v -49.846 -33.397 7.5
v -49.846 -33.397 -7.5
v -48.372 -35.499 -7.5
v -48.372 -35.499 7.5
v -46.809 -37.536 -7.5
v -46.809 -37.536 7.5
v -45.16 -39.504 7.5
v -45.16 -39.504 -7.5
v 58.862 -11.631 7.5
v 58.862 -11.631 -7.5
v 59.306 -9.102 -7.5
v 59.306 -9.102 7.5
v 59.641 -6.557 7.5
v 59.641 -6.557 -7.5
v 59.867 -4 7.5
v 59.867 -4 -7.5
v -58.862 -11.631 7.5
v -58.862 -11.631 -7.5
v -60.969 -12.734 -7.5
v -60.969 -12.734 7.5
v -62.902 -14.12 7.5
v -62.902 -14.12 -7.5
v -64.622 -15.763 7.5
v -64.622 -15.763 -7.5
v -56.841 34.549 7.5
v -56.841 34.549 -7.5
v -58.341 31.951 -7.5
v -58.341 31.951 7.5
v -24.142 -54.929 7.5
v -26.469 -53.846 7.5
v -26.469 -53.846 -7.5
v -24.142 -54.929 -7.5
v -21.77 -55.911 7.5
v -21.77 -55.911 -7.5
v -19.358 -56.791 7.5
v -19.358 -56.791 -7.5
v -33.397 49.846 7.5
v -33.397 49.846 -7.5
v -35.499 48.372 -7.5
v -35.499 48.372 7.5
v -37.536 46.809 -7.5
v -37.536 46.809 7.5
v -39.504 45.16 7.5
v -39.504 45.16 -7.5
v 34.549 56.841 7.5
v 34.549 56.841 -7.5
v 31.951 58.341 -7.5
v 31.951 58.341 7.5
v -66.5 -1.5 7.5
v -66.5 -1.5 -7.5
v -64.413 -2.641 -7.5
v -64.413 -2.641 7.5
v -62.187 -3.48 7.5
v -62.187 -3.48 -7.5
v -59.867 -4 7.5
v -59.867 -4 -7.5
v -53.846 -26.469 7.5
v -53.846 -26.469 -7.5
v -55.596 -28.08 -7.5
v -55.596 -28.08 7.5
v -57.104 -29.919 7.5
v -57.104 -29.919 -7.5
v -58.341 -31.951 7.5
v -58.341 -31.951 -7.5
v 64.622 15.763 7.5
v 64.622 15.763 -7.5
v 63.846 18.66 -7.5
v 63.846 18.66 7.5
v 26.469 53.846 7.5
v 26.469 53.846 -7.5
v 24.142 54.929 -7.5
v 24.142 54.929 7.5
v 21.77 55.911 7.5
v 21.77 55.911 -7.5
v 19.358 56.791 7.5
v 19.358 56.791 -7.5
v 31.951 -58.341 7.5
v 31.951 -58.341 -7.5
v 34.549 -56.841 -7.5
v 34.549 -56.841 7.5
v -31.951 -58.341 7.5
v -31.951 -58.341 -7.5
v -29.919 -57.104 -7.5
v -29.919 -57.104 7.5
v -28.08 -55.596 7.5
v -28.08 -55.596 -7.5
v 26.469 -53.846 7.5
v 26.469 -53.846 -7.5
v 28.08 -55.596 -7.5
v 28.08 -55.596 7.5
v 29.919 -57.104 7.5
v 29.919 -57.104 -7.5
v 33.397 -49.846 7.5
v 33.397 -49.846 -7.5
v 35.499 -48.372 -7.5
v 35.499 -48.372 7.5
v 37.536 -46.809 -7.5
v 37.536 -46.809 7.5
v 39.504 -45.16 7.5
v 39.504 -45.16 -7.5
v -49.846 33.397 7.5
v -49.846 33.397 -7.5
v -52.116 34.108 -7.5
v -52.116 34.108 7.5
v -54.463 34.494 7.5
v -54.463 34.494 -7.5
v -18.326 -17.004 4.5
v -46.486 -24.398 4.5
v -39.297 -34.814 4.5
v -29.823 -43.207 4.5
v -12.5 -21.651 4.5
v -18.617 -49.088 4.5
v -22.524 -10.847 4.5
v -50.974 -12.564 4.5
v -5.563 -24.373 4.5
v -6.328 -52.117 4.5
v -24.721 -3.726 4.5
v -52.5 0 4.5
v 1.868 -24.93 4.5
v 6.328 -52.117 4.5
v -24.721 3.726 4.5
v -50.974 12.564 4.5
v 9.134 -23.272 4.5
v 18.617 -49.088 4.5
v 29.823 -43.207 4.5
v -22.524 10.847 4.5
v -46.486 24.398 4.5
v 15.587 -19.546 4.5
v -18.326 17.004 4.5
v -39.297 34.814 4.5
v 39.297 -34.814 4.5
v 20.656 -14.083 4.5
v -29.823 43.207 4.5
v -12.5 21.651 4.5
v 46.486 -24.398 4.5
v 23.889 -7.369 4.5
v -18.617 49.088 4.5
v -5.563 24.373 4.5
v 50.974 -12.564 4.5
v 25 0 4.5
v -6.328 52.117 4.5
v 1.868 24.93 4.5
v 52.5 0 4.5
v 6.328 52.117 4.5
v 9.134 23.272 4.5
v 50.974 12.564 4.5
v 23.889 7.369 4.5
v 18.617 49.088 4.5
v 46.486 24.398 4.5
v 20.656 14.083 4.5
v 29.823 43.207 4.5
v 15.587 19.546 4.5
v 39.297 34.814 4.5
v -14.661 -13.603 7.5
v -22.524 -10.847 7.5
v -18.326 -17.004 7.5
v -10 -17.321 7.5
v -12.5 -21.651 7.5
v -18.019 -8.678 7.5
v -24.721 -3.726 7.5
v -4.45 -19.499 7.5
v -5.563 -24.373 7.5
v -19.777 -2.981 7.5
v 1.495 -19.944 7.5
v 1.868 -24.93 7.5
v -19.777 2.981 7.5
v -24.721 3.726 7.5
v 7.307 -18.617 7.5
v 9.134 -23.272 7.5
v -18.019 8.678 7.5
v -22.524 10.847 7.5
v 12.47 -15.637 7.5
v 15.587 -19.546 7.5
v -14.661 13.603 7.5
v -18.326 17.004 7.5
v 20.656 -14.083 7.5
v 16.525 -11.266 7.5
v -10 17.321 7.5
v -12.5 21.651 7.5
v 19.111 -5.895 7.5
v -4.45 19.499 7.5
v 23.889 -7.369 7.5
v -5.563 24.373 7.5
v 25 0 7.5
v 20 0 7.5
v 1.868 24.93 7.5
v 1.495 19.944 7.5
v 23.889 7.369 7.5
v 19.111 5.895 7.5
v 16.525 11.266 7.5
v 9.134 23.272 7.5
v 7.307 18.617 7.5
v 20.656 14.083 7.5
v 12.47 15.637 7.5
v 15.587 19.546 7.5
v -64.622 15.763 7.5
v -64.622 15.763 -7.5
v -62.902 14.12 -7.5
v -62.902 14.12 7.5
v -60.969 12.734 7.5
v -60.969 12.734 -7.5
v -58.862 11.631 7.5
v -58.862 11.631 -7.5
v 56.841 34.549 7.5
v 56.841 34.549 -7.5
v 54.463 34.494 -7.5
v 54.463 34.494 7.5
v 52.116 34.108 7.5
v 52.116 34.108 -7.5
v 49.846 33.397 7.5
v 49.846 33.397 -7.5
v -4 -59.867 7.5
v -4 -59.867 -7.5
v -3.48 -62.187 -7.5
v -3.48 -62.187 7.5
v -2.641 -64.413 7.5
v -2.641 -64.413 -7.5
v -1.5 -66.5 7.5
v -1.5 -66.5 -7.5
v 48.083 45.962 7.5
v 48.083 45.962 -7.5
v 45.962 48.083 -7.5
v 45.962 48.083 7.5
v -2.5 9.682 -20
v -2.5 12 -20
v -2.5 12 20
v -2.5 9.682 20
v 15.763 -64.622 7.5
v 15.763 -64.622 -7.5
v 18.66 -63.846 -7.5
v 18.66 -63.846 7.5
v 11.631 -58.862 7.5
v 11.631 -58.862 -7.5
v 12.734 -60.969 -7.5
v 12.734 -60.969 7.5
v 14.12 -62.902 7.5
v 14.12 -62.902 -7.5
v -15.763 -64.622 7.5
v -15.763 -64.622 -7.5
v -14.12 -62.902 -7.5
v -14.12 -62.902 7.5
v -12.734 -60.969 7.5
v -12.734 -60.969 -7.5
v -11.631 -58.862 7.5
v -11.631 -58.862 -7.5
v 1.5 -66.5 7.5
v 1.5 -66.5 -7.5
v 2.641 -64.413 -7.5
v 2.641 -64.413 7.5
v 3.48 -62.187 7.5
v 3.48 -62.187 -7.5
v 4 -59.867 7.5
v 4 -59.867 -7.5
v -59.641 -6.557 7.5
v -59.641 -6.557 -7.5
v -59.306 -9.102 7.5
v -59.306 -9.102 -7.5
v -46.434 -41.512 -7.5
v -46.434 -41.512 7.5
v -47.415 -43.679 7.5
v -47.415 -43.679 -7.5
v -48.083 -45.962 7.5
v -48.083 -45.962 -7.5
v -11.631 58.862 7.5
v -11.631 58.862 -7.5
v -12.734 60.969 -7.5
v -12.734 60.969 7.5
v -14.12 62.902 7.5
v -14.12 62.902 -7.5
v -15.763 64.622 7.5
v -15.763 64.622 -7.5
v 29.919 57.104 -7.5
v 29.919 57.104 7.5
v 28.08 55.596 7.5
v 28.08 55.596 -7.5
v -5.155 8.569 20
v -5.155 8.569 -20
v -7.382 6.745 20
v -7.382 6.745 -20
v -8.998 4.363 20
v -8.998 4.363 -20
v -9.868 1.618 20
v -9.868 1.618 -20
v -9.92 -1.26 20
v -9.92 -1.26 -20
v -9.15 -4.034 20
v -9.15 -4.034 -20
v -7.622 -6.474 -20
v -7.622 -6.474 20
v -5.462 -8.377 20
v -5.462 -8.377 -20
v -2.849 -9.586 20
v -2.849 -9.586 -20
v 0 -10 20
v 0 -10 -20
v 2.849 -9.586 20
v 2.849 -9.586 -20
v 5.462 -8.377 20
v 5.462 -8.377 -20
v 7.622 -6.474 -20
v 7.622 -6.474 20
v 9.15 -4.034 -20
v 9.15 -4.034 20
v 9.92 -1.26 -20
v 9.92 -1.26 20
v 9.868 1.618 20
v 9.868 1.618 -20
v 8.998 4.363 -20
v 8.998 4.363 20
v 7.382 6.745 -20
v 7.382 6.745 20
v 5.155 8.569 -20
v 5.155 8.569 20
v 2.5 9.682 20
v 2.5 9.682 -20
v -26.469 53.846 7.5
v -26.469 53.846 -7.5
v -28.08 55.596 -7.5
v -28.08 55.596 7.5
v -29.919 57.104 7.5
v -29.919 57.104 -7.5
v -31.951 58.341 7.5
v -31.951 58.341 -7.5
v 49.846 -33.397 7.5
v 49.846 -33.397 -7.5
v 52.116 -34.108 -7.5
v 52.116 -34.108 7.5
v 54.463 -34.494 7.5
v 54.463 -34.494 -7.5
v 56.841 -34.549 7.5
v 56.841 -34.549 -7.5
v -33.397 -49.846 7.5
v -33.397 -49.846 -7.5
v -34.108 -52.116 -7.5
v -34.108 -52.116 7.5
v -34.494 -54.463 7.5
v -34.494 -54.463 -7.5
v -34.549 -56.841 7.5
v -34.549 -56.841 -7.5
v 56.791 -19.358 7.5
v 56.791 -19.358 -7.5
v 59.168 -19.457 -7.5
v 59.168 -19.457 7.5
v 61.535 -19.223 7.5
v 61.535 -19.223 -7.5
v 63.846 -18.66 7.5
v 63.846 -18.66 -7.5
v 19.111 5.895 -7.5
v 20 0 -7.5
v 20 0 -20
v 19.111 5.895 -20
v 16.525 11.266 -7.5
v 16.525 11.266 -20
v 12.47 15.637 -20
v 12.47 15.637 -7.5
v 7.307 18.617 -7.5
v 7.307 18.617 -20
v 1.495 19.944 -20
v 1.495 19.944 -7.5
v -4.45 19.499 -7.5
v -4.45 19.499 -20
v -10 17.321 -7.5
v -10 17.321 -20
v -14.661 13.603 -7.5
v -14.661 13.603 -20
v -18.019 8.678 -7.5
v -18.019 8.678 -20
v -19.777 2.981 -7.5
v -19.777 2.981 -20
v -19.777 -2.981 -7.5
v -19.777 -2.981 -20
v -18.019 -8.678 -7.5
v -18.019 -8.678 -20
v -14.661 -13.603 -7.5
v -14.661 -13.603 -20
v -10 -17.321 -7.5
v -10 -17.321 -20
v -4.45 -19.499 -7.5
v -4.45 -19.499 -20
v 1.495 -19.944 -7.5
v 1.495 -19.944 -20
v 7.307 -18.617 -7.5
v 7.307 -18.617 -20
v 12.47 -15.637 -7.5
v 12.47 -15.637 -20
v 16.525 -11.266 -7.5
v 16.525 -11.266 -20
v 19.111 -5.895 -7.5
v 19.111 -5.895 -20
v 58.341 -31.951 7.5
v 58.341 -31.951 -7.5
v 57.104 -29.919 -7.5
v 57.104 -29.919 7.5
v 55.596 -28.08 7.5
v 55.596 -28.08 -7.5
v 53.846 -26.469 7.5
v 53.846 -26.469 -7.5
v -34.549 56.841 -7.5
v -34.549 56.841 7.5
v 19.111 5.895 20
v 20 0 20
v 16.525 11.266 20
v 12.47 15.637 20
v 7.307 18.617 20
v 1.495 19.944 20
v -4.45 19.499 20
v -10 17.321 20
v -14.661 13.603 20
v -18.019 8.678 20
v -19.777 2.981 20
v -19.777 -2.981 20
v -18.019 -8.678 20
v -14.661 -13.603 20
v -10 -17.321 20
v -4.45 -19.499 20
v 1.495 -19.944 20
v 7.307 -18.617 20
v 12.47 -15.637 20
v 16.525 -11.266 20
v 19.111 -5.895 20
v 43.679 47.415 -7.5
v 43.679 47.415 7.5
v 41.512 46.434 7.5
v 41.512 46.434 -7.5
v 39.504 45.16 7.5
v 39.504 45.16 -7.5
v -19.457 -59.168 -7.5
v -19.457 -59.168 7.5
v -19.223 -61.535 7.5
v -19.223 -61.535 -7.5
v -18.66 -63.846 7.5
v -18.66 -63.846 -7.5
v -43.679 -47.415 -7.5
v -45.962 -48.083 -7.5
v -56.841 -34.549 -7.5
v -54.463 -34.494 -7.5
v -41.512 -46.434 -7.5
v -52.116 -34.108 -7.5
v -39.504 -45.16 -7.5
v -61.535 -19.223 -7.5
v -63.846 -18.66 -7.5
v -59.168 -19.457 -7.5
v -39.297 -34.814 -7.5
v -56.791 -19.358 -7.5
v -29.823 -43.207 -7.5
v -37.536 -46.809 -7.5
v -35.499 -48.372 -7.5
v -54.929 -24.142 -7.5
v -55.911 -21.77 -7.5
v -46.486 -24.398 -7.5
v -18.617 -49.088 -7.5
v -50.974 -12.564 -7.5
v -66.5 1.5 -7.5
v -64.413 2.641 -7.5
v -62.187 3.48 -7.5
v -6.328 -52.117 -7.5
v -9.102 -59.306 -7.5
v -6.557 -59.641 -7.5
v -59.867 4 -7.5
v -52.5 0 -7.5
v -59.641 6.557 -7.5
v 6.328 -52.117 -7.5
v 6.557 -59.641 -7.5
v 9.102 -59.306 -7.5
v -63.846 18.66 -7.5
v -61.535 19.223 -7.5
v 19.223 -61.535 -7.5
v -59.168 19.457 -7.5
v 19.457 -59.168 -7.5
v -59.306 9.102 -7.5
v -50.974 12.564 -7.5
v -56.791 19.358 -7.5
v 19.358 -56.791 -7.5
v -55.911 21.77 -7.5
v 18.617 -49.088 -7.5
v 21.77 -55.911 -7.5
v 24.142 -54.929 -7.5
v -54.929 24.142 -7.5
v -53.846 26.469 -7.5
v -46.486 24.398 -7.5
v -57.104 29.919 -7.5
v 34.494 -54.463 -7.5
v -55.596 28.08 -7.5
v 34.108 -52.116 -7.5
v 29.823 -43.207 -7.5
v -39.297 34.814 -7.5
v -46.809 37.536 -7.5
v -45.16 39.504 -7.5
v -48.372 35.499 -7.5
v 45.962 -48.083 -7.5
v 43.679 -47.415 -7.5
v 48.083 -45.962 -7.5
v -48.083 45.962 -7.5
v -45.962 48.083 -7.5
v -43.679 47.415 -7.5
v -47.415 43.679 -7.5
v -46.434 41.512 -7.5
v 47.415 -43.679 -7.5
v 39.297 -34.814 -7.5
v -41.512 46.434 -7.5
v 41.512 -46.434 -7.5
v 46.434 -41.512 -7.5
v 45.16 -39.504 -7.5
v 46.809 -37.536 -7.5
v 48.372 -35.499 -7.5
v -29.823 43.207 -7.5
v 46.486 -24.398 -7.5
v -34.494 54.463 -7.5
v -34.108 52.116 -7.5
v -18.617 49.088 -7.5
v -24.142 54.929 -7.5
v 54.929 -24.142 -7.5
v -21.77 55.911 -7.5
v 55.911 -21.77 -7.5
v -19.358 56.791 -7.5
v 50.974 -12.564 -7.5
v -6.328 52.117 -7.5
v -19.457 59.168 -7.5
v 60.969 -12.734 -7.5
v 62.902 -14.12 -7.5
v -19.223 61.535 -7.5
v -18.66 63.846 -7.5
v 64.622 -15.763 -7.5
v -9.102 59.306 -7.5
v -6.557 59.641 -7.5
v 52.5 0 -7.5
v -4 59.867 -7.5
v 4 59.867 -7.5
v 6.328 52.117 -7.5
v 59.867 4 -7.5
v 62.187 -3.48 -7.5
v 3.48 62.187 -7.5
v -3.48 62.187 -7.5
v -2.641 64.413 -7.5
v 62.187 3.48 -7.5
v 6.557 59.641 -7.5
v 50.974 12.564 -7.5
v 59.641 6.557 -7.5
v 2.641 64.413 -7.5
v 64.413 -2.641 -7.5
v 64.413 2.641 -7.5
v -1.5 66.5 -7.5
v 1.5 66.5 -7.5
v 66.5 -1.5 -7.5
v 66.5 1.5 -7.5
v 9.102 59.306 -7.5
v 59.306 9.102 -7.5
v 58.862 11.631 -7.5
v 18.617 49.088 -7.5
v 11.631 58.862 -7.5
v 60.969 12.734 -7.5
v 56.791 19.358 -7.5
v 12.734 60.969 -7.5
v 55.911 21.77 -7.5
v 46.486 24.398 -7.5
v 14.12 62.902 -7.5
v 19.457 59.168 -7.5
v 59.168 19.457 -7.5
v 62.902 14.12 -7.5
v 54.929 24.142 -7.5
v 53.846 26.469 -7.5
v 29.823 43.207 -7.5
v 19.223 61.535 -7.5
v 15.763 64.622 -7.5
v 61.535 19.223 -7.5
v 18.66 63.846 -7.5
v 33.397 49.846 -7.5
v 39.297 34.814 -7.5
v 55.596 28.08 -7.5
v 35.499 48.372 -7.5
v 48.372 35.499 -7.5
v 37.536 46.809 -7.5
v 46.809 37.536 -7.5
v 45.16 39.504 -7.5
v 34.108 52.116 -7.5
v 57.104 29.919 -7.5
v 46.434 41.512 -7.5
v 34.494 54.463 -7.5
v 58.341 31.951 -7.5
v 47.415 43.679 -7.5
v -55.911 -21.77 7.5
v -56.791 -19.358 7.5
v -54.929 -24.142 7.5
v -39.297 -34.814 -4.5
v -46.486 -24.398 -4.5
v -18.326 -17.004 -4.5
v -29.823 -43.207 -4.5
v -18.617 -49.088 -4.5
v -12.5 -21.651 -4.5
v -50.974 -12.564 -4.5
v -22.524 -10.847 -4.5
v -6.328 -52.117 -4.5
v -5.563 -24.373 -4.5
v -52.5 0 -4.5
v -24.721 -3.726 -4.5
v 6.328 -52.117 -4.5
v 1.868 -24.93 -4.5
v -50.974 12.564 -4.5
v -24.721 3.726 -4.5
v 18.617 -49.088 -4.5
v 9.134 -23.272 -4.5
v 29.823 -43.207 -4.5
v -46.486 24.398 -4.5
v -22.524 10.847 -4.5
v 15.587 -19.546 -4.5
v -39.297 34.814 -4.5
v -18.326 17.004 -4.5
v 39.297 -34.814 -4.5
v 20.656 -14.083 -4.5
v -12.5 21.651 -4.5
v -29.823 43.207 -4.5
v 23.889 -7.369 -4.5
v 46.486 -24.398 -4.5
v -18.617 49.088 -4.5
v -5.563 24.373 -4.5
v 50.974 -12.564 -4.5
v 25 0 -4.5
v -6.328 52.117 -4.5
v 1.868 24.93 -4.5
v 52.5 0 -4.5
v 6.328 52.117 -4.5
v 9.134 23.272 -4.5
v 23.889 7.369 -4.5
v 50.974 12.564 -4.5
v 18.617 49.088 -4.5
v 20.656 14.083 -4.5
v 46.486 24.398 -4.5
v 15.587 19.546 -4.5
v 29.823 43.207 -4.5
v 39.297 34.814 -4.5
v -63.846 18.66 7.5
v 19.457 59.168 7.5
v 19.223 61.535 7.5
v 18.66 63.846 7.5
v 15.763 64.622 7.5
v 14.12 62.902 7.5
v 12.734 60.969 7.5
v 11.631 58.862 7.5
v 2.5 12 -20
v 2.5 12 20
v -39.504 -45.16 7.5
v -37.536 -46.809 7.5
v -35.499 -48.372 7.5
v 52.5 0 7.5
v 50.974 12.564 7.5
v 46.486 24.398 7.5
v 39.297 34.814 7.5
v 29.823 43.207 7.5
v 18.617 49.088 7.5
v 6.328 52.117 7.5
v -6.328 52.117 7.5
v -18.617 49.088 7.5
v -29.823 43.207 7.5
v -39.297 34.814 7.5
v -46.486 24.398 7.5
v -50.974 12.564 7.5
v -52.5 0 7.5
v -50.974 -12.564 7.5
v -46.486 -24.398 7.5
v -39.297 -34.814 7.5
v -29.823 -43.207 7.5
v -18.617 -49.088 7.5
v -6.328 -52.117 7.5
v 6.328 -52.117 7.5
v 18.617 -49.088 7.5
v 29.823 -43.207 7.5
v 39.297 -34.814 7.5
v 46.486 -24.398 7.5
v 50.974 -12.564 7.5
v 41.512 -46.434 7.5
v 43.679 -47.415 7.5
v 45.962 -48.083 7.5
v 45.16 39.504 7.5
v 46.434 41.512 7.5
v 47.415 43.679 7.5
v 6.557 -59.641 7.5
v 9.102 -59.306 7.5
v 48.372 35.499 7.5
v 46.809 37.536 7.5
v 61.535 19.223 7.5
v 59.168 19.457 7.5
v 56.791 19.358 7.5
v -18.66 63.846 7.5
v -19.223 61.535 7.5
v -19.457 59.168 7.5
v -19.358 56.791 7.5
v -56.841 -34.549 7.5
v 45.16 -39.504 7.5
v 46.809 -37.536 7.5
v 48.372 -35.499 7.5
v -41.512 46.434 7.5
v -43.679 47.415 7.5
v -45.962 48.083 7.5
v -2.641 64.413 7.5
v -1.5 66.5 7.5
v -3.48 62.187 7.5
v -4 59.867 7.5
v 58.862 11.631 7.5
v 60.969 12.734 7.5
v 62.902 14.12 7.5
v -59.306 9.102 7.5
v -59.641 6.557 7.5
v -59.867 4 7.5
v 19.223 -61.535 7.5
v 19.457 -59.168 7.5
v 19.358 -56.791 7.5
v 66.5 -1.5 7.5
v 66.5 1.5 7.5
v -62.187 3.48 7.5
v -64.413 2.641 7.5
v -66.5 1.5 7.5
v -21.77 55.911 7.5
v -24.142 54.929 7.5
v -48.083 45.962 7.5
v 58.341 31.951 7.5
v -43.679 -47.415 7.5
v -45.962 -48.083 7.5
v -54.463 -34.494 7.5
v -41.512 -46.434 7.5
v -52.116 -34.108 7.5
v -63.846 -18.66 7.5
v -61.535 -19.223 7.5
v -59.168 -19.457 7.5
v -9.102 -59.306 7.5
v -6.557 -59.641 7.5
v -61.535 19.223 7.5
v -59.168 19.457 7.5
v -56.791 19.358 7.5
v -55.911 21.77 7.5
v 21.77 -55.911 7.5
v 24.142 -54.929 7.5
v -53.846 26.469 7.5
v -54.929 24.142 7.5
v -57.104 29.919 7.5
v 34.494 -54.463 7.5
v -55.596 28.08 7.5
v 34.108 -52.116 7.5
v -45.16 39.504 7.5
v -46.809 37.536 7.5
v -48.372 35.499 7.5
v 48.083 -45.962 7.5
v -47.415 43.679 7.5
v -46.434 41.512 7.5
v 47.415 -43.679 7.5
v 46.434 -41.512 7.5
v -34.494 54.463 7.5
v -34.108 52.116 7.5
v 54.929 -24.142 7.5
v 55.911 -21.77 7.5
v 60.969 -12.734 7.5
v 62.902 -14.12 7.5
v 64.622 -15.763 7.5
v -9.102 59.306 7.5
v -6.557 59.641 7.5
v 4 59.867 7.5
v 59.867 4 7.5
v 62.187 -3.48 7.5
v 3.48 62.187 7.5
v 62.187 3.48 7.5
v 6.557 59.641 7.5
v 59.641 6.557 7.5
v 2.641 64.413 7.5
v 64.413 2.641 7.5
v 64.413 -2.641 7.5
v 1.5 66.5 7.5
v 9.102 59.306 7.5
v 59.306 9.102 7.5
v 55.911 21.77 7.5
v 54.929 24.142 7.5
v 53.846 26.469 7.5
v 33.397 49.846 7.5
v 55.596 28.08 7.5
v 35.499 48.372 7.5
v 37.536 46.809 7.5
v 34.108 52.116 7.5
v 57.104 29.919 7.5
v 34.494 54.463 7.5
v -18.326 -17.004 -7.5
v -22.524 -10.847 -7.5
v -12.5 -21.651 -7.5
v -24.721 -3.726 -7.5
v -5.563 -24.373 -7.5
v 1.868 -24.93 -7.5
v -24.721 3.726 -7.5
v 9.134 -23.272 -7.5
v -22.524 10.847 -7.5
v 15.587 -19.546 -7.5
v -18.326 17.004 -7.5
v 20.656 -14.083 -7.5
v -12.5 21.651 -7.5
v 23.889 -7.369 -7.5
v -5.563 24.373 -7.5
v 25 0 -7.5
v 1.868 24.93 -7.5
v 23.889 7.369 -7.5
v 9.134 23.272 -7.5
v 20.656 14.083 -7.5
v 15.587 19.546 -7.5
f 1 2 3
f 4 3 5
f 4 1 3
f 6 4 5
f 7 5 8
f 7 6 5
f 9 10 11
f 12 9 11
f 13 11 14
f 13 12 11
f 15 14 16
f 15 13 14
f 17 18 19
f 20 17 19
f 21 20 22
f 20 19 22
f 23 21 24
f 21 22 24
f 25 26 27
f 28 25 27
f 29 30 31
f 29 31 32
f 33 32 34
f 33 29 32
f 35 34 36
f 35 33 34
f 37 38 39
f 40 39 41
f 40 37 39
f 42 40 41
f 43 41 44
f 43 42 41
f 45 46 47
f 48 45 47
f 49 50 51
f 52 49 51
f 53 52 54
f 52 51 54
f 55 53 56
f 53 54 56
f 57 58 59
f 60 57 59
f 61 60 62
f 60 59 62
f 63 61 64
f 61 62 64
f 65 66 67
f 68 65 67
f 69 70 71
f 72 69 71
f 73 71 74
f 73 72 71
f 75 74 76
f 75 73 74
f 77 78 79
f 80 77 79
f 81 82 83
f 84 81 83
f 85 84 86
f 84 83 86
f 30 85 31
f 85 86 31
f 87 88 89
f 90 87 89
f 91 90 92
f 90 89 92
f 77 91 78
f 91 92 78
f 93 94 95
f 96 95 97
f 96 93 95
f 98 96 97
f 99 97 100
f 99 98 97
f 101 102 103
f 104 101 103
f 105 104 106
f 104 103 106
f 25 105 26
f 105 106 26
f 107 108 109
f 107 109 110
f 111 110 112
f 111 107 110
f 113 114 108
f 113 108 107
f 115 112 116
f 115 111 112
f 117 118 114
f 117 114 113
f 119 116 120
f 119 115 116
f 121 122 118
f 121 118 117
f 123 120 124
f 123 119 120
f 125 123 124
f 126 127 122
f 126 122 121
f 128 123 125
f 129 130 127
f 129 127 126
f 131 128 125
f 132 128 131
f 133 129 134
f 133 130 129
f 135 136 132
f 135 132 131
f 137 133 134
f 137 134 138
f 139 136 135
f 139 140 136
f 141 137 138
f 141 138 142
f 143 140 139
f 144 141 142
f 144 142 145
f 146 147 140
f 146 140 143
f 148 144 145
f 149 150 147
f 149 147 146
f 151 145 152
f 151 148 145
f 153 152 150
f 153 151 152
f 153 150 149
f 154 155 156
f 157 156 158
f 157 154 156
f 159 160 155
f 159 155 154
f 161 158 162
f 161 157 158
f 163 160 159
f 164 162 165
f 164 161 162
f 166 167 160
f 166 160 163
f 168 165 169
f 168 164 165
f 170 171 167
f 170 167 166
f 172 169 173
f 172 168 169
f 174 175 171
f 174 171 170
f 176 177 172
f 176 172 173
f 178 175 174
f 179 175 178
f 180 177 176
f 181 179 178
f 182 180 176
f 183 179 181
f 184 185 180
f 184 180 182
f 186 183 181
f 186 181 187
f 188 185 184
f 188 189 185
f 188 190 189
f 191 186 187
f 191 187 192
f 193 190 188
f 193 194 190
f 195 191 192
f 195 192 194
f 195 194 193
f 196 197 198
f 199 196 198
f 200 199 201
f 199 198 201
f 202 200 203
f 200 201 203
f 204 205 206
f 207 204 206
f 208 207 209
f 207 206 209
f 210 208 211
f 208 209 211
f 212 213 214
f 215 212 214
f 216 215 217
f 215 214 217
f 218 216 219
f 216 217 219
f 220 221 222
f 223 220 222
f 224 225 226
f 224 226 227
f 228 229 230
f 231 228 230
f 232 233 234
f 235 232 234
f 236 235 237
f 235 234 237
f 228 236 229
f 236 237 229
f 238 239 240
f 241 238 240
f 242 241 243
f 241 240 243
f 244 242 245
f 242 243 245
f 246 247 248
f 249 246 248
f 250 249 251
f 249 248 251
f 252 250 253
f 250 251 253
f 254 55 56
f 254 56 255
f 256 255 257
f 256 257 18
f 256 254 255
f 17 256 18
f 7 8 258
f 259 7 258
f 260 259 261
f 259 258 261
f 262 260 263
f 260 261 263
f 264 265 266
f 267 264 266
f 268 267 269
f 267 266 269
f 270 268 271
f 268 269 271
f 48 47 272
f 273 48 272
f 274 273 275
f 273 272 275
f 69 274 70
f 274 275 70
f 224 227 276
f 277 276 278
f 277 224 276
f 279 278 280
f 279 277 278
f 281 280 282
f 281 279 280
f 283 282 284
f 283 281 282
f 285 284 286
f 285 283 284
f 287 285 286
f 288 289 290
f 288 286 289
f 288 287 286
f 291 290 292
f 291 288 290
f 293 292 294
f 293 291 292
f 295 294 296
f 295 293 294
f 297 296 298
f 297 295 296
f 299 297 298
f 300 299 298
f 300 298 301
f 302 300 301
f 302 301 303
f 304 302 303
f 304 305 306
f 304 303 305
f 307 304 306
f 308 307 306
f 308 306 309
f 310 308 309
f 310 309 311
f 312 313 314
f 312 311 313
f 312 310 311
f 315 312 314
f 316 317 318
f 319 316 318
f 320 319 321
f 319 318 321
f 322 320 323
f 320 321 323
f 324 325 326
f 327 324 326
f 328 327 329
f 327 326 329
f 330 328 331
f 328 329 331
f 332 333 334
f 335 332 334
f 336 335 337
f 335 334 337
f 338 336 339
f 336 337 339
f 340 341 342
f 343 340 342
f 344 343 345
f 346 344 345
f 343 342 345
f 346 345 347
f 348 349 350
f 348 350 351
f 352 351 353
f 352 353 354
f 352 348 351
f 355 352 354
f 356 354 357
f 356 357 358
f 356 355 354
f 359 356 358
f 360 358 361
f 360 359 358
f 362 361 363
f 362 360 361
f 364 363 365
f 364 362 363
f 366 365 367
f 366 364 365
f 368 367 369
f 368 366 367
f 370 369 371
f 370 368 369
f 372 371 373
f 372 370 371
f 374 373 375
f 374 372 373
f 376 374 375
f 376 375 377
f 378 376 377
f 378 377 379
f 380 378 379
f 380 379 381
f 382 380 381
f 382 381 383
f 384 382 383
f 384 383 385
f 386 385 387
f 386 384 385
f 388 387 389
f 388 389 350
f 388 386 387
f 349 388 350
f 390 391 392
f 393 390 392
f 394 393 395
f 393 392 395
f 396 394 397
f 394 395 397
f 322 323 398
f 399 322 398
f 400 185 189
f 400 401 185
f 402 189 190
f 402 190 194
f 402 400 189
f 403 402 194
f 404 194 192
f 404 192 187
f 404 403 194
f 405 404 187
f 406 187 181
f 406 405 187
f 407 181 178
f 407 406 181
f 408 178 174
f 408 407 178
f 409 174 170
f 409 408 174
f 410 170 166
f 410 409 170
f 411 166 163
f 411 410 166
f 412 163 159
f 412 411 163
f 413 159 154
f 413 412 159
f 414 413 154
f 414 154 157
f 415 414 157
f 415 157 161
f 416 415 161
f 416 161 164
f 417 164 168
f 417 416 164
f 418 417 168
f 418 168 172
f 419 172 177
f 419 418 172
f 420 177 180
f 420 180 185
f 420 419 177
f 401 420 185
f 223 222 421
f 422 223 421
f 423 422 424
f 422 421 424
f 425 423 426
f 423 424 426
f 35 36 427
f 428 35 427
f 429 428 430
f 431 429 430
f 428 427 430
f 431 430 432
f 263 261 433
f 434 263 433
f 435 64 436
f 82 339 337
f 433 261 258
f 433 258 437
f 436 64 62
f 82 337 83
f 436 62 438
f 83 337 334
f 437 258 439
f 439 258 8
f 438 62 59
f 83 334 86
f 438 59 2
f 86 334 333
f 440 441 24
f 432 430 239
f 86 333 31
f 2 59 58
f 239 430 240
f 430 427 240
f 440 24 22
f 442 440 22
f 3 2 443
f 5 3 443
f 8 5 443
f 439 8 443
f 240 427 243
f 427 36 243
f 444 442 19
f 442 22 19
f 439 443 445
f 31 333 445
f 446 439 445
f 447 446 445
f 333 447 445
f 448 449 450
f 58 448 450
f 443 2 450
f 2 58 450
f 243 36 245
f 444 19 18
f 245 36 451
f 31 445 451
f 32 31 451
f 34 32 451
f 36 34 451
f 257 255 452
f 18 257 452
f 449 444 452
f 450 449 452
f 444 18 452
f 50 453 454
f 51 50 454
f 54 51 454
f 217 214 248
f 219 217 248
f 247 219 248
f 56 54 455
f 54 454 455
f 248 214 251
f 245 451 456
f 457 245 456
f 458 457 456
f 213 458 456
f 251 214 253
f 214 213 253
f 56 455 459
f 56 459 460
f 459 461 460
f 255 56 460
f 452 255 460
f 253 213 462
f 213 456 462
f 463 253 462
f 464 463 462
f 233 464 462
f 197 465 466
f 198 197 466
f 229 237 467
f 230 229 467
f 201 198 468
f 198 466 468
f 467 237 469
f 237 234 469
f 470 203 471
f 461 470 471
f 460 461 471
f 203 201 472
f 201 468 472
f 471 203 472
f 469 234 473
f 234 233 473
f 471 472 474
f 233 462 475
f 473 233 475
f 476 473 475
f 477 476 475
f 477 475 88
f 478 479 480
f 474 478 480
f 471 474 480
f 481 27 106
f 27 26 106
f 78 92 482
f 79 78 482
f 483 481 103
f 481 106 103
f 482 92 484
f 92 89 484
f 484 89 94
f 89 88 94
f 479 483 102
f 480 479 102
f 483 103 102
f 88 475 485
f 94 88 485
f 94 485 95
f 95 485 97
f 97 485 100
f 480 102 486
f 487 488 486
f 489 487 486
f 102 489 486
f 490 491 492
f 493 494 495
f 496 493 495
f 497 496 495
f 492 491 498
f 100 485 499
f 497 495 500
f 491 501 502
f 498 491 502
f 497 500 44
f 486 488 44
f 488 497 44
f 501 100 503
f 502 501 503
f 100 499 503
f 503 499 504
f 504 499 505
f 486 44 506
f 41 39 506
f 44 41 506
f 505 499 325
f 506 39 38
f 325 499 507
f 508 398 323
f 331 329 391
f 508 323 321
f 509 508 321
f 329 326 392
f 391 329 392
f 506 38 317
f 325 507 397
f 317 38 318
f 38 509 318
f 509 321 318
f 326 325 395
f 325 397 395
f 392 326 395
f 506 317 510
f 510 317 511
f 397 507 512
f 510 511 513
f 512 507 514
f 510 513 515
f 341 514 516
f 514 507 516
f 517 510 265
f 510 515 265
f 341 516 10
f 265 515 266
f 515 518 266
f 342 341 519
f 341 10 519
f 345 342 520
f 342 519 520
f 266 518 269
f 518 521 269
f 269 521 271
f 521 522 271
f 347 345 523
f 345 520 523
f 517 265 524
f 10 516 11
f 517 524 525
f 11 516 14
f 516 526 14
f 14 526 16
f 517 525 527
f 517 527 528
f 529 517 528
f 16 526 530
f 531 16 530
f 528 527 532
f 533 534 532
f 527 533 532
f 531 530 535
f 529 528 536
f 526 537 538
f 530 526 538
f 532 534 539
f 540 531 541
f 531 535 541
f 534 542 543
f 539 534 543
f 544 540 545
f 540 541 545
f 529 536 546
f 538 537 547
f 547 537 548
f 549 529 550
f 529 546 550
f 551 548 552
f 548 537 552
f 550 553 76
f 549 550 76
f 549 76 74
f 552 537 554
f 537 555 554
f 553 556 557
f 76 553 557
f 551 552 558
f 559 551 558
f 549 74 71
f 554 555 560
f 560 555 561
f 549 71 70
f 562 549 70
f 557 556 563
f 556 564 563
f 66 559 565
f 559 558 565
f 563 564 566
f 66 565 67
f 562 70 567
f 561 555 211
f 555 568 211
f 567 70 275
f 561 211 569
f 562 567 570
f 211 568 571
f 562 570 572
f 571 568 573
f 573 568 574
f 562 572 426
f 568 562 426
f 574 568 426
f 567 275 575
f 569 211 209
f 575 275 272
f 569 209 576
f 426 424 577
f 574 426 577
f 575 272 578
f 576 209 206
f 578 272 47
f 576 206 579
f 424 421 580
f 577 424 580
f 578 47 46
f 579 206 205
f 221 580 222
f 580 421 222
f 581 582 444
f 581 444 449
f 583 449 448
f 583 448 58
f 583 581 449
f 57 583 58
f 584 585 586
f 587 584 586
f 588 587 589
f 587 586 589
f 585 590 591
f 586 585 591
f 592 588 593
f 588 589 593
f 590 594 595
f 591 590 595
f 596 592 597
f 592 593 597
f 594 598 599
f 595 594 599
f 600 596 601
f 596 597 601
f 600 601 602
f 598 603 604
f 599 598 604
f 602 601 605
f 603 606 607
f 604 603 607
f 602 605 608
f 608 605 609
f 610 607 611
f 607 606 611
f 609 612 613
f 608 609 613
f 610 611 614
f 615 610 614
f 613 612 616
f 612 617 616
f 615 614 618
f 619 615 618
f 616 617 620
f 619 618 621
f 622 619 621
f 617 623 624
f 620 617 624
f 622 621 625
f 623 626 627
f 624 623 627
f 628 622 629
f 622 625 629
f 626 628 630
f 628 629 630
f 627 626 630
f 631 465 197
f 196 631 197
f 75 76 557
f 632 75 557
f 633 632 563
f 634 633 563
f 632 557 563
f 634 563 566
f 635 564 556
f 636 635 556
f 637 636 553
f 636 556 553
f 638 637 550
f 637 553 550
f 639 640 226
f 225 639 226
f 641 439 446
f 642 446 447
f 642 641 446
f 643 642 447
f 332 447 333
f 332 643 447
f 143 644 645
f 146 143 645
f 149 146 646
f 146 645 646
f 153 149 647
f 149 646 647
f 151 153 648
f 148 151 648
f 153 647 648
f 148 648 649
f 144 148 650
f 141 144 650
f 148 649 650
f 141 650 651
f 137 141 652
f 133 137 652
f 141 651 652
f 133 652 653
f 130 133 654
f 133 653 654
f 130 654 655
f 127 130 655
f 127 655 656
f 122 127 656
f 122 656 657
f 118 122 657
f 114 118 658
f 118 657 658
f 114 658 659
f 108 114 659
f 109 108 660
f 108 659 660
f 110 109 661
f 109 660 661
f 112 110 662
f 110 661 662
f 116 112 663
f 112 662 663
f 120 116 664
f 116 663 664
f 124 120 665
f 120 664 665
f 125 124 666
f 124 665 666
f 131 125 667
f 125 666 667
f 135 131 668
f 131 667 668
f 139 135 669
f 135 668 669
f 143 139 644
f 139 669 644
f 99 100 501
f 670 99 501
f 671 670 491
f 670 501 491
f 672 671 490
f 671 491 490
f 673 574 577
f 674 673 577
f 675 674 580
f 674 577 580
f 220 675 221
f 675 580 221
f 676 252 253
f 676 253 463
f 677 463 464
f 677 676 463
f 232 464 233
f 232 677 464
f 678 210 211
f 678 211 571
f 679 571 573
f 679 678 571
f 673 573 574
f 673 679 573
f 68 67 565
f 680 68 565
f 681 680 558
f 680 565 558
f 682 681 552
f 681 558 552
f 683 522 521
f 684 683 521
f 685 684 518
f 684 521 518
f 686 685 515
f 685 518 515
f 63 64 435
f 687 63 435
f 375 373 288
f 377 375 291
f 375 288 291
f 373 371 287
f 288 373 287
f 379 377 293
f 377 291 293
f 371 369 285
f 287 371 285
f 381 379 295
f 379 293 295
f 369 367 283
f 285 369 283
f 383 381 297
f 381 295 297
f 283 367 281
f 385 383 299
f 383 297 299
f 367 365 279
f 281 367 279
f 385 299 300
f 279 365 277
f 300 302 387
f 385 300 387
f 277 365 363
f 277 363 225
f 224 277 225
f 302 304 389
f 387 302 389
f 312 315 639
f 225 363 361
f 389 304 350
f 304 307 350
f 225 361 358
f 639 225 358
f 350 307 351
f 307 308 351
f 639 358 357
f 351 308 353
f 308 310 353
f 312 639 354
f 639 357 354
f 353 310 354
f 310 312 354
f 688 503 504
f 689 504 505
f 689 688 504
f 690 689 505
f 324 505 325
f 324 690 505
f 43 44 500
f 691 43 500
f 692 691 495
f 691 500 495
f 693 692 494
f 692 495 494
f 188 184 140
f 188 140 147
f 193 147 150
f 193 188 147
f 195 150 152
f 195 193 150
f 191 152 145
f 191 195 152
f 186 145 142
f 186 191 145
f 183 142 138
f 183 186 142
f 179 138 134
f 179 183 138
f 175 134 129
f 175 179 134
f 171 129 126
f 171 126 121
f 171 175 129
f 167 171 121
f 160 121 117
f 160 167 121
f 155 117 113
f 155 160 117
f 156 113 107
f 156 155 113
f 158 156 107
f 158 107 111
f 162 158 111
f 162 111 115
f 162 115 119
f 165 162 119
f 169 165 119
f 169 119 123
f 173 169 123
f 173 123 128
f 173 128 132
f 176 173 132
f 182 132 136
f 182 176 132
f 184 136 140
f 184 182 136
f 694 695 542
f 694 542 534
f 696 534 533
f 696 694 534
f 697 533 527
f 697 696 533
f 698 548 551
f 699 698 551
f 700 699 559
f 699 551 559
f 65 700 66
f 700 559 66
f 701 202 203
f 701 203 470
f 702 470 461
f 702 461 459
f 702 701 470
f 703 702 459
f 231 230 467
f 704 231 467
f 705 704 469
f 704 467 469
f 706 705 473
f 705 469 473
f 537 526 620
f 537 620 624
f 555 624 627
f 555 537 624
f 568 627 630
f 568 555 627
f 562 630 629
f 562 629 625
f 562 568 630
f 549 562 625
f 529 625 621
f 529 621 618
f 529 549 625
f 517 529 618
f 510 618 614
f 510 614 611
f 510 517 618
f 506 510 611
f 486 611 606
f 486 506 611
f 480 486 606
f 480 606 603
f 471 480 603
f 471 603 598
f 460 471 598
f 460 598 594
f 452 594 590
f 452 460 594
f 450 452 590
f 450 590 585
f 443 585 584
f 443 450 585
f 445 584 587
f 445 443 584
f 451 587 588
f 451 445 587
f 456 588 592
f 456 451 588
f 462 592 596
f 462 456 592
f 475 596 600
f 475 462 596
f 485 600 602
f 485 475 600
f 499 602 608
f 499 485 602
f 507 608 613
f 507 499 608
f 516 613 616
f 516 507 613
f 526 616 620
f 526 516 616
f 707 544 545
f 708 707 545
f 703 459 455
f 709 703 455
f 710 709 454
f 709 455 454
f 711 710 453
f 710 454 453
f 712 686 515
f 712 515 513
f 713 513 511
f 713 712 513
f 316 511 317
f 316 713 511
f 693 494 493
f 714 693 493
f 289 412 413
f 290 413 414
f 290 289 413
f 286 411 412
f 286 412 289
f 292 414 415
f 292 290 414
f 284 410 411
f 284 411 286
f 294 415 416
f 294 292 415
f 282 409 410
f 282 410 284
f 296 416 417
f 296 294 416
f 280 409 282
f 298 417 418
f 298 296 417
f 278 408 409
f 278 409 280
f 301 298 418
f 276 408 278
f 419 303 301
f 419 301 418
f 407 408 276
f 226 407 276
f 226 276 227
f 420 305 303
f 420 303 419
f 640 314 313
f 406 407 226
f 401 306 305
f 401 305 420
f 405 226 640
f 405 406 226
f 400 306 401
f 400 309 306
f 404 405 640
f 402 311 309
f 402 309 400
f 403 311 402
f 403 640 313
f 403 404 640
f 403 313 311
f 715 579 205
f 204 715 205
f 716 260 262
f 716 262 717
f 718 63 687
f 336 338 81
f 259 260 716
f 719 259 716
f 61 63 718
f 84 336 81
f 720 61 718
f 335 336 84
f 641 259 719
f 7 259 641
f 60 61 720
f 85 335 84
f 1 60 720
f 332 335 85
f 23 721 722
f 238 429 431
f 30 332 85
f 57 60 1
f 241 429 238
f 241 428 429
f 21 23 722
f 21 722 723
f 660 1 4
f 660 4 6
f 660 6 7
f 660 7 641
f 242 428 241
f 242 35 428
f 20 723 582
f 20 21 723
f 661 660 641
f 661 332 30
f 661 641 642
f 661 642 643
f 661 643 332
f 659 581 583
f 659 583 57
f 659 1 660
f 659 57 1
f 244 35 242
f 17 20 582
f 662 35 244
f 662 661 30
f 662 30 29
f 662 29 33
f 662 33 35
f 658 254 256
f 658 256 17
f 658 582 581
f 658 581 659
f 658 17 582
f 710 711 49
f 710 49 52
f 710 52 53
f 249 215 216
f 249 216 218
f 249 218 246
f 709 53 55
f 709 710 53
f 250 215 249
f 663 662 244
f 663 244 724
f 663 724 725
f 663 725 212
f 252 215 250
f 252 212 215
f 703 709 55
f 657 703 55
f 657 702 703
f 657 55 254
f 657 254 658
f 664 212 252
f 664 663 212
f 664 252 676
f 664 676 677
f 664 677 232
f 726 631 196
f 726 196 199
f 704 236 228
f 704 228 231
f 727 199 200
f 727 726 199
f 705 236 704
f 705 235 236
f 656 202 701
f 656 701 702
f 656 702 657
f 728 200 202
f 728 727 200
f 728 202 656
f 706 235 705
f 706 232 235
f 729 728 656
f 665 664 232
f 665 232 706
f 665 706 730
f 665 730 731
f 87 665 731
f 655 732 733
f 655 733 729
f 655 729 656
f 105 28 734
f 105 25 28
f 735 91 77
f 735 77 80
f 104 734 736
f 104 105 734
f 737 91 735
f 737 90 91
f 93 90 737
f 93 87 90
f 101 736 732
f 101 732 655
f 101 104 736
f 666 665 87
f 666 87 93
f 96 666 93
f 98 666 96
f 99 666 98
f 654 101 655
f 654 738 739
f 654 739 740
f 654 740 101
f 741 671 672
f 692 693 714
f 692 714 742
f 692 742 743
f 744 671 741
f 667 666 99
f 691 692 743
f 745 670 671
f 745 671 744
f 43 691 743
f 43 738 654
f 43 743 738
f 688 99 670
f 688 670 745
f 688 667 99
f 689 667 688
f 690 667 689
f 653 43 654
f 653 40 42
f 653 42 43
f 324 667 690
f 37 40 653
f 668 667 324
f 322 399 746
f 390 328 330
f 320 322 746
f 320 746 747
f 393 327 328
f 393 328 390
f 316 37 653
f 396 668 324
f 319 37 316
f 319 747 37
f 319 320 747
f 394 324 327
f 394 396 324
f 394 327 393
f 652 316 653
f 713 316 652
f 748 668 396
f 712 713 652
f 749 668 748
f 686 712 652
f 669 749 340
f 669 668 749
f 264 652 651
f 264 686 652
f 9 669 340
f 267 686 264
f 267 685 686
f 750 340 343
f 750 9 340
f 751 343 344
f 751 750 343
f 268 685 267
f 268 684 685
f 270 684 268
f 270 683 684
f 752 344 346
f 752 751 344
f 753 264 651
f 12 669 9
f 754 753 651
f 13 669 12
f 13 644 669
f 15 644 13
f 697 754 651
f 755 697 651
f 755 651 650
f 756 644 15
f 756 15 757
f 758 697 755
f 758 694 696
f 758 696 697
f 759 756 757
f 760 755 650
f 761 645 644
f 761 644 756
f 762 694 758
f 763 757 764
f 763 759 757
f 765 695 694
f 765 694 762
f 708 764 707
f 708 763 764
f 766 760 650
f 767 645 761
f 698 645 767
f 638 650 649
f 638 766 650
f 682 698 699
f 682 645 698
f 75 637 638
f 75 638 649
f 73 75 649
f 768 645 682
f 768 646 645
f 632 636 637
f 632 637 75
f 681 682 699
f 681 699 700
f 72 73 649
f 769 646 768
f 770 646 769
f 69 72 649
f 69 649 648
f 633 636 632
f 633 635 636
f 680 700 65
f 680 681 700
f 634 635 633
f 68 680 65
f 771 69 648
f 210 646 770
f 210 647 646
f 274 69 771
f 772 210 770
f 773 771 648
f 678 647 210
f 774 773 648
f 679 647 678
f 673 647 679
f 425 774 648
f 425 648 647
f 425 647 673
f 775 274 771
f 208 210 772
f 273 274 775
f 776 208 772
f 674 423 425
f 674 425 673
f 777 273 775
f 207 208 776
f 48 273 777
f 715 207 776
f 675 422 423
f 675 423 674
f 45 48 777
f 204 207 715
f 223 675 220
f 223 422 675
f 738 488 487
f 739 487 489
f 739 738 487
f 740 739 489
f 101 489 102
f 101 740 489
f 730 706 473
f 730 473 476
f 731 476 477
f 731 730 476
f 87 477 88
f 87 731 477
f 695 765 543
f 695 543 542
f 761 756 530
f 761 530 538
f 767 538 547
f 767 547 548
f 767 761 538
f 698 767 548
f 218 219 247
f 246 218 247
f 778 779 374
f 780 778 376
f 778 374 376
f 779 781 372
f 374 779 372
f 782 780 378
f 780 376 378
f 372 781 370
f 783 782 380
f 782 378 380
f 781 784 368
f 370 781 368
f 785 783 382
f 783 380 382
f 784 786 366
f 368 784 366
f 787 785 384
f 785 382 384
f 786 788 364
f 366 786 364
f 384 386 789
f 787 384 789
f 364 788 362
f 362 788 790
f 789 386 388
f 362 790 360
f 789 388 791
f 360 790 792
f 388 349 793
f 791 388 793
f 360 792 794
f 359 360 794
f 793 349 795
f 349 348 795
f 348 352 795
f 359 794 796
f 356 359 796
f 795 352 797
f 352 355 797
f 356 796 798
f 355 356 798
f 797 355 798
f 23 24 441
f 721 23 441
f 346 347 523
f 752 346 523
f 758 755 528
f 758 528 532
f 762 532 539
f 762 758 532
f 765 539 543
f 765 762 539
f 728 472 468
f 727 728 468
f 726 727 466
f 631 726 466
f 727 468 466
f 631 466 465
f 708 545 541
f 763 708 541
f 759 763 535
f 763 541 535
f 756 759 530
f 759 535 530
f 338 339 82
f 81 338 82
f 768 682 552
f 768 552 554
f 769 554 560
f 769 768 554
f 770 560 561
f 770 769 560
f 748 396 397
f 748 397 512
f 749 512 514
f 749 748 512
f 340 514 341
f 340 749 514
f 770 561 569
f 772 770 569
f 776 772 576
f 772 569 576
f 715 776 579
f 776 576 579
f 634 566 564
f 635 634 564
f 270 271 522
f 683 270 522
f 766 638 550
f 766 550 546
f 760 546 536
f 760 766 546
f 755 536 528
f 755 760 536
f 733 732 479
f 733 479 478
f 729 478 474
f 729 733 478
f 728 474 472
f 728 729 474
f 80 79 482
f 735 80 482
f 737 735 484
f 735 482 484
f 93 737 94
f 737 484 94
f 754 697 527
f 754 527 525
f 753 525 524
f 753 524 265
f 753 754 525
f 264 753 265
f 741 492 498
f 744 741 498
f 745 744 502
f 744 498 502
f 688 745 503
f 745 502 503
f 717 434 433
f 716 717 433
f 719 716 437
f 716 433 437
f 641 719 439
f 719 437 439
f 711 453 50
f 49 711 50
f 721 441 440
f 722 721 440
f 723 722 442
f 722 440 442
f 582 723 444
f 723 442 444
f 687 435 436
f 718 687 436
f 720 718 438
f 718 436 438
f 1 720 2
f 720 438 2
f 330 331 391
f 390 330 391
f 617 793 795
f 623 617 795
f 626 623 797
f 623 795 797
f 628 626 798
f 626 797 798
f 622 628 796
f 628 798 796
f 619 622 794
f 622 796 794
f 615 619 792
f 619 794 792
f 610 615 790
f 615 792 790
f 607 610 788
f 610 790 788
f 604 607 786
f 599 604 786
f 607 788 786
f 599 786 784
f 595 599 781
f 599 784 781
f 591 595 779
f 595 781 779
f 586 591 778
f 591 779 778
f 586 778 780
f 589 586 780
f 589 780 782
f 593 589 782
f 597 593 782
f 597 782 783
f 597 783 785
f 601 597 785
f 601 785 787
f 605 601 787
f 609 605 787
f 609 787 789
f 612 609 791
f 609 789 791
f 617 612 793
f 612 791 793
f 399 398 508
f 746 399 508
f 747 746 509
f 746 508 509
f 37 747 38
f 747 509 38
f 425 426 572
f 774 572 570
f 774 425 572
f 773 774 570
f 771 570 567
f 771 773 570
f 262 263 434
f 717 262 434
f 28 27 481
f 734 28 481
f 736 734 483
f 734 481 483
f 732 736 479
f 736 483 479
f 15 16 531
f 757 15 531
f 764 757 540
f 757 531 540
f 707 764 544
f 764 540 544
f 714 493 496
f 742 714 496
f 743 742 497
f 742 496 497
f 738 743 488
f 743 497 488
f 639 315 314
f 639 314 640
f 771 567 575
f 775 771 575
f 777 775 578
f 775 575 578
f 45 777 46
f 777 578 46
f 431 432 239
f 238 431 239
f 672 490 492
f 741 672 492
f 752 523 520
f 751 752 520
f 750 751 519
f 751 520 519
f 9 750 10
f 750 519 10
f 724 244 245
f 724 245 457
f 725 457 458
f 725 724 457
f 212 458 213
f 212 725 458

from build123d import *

# Parameters (mm, degrees)
SKETCH1_R           = 60
BOSS_EXTRUDE1_DEPTH = 7.5
BOSS_EXTRUDE2_DEPTH = 15
CIRPATTERN1_START   = -7.5
CIRPATTERN1_DEPTH   = 15
SKETCH3_R           = 20
BOSS_EXTRUDE3_DEPTH = 20
CUT_EXTRUDE1_DEPTH  = 103.198336581
CUT_EXTRUDE4_START  = -7.5
SKETCH5_R           = 52.5
SKETCH5_R_2         = 25
CUT_EXTRUDE4_DEPTH  = 3


# Read off the part's stored shape, not the designer's step: CirPattern1
with BuildPart() as part:
    # Sketch1 → Boss-Extrude1 (new, symmetric)
    with BuildSketch(Plane.XY):
        Circle(SKETCH1_R)
    extrude(amount=BOSS_EXTRUDE1_DEPTH, both=True)

    # Sketch2 → Boss-Extrude2 (add)
    with BuildSketch(Plane.XY.offset(7.5)):
        with BuildLine():
            Line((0, 66.5), (0, 60))
            ThreePointArc((0, 60), (2.001113277, 59.966620262), (4, 59.866518188))
            ThreePointArc((4, 59.866518188), (3.099609074, 63.315018359), (1.5, 66.5))
            Line((1.5, 66.5), (0, 66.5))
        make_face()
        with BuildLine():
            ThreePointArc((-4, 59.866518188), (-2.001113277, 59.966620262), (0, 60))
            Line((0, 60), (0, 66.5))
            Line((0, 66.5), (-1.5, 66.5))
            ThreePointArc((-1.5, 66.5), (-3.099609074, 63.315018359), (-4, 59.866518188))
        make_face()
    extrude(amount=-BOSS_EXTRUDE2_DEPTH)

    # CirPattern1 outline → CirPattern1 (add)
    with BuildSketch(Plane.XY.offset(CIRPATTERN1_START)):
        with BuildLine():
            ThreePointArc((-18.660355239, 63.845838881), (-19.381125049, 60.355373564), (-19.358298376, 56.791339868))
            ThreePointArc((-19.358298376, 56.791339868), (-15.529142706, 57.955549577), (-11.630891766, 58.861892228))
            ThreePointArc((-11.630891766, 58.861892228), (-13.393140136, 61.959849286), (-15.76257776, 64.622296016))
            Line((-15.76257776, 64.622296016), (-18.660355239, 63.845838881))
        make_face()
        with BuildLine():
            ThreePointArc((-34.549038106, 56.840689352), (-34.34184938, 53.282609803), (-33.397360709, 49.845925587))
            ThreePointArc((-33.397360709, 49.845925587), (-30, 51.961524227), (-26.469157479, 53.845925587))
            ThreePointArc((-26.469157479, 53.845925587), (-28.973168979, 56.382218877), (-31.950961894, 58.340689352))
            Line((-31.950961894, 58.340689352), (-34.549038106, 56.840689352))
        make_face()
        with BuildLine():
            ThreePointArc((-48.083261121, 45.961940777), (-46.962233428, 42.578724237), (-45.160448102, 39.503593852))
            ThreePointArc((-45.160448102, 39.503593852), (-42.426406871, 42.426406871), (-39.503593852, 45.160448102))
            ThreePointArc((-39.503593852, 45.160448102), (-42.578724237, 46.962233428), (-45.961940777, 48.083261121))
            Line((-45.961940777, 48.083261121), (-48.083261121, 45.961940777))
        make_face()
        with BuildLine():
            ThreePointArc((-58.340689352, 31.950961894), (-56.382218877, 28.973168979), (-53.845925587, 26.469157479))
            ThreePointArc((-53.845925587, 26.469157479), (-51.961524227, 30), (-49.845925587, 33.397360709))
            ThreePointArc((-49.845925587, 33.397360709), (-53.282609803, 34.34184938), (-56.840689352, 34.549038106))
            Line((-56.840689352, 34.549038106), (-58.340689352, 31.950961894))
        make_face()
        with BuildLine():
            ThreePointArc((-64.622296016, 15.76257776), (-61.959849286, 13.393140136), (-58.861892229, 11.630891766))
            ThreePointArc((-58.861892229, 11.630891766), (-57.955549577, 15.529142706), (-56.791339868, 19.358298376))
            ThreePointArc((-56.791339868, 19.358298376), (-60.355373564, 19.381125049), (-63.845838881, 18.660355239))
            Line((-63.845838881, 18.660355239), (-64.622296016, 15.76257776))
        make_face()
        with BuildLine():
            ThreePointArc((-66.5, -1.5), (-63.315018359, -3.099609074), (-59.866518188, -4))
            ThreePointArc((-59.866518188, -4), (-60, 0), (-59.866518188, 4))
            ThreePointArc((-59.866518188, 4), (-63.315018359, 3.099609074), (-66.5, 1.5))
            Line((-66.5, 1.5), (-66.5, -1.5))
        make_face()
        with BuildLine():
            ThreePointArc((-63.845838881, -18.660355239), (-60.355373564, -19.381125049), (-56.791339868, -19.358298376))
            ThreePointArc((-56.791339868, -19.358298376), (-57.955549577, -15.529142706), (-58.861892228, -11.630891766))
            ThreePointArc((-58.861892228, -11.630891766), (-61.959849286, -13.393140136), (-64.622296016, -15.76257776))
            Line((-64.622296016, -15.76257776), (-63.845838881, -18.660355239))
        make_face()
        with BuildLine():
            ThreePointArc((-56.840689352, -34.549038106), (-53.282609803, -34.34184938), (-49.845925587, -33.397360709))
            ThreePointArc((-49.845925587, -33.397360709), (-51.961524227, -30), (-53.845925587, -26.469157479))
            ThreePointArc((-53.845925587, -26.469157479), (-56.382218877, -28.973168979), (-58.340689352, -31.950961894))
            Line((-58.340689352, -31.950961894), (-56.840689352, -34.549038106))
        make_face()
        with BuildLine():
            ThreePointArc((-45.961940777, -48.083261121), (-42.578724237, -46.962233428), (-39.503593852, -45.160448102))
            ThreePointArc((-39.503593852, -45.160448102), (-42.426406871, -42.426406871), (-45.160448102, -39.503593852))
            ThreePointArc((-45.160448102, -39.503593852), (-46.962233428, -42.578724237), (-48.083261121, -45.961940777))
            Line((-48.083261121, -45.961940777), (-45.961940777, -48.083261121))
        make_face()
        with BuildLine():
            ThreePointArc((-31.950961894, -58.340689352), (-28.973168979, -56.382218877), (-26.469157479, -53.845925587))
            ThreePointArc((-26.469157479, -53.845925587), (-30, -51.961524227), (-33.397360709, -49.845925587))
            ThreePointArc((-33.397360709, -49.845925587), (-34.34184938, -53.282609803), (-34.549038106, -56.840689352))
            Line((-34.549038106, -56.840689352), (-31.950961894, -58.340689352))
        make_face()
        with BuildLine():
            ThreePointArc((-15.76257776, -64.622296016), (-13.393140136, -61.959849286), (-11.630891766, -58.861892229))
            ThreePointArc((-11.630891766, -58.861892229), (-15.529142706, -57.955549577), (-19.358298376, -56.791339868))
            ThreePointArc((-19.358298376, -56.791339868), (-19.381125049, -60.355373564), (-18.660355239, -63.845838881))
            Line((-18.660355239, -63.845838881), (-15.76257776, -64.622296016))
        make_face()
        with BuildLine():
            ThreePointArc((1.5, -66.5), (3.099609074, -63.315018359), (4, -59.866518188))
            ThreePointArc((4, -59.866518188), (0, -60), (-4, -59.866518188))
            ThreePointArc((-4, -59.866518188), (-3.099609074, -63.315018359), (-1.5, -66.5))
            Line((-1.5, -66.5), (1.5, -66.5))
        make_face()
        with BuildLine():
            ThreePointArc((18.660355239, -63.845838881), (19.381125049, -60.355373564), (19.358298376, -56.791339868))
            ThreePointArc((19.358298376, -56.791339868), (15.529142706, -57.955549577), (11.630891766, -58.861892229))
            ThreePointArc((11.630891766, -58.861892229), (13.393140136, -61.959849286), (15.76257776, -64.622296016))
            Line((15.76257776, -64.622296016), (18.660355239, -63.845838881))
        make_face()
        with BuildLine():
            ThreePointArc((34.549038106, -56.840689352), (34.34184938, -53.282609803), (33.397360709, -49.845925587))
            ThreePointArc((33.397360709, -49.845925587), (30, -51.961524227), (26.469157479, -53.845925587))
            ThreePointArc((26.469157479, -53.845925587), (28.973168979, -56.382218877), (31.950961894, -58.340689352))
            Line((31.950961894, -58.340689352), (34.549038106, -56.840689352))
        make_face()
        with BuildLine():
            ThreePointArc((48.083261121, -45.961940777), (46.962233428, -42.578724237), (45.160448102, -39.503593852))
            ThreePointArc((45.160448102, -39.503593852), (42.426406871, -42.426406871), (39.503593852, -45.160448102))
            ThreePointArc((39.503593852, -45.160448102), (42.578724237, -46.962233428), (45.961940777, -48.083261121))
            Line((45.961940777, -48.083261121), (48.083261121, -45.961940777))
        make_face()
        with BuildLine():
            ThreePointArc((58.340689352, -31.950961894), (56.382218877, -28.973168979), (53.845925587, -26.469157479))
            ThreePointArc((53.845925587, -26.469157479), (51.961524227, -30), (49.845925587, -33.397360709))
            ThreePointArc((49.845925587, -33.397360709), (53.282609803, -34.34184938), (56.840689352, -34.549038106))
            Line((56.840689352, -34.549038106), (58.340689352, -31.950961894))
        make_face()
        with BuildLine():
            ThreePointArc((64.622296016, -15.76257776), (61.959849286, -13.393140136), (58.861892229, -11.630891766))
            ThreePointArc((58.861892229, -11.630891766), (57.955549577, -15.529142706), (56.791339868, -19.358298376))
            ThreePointArc((56.791339868, -19.358298376), (60.355373564, -19.381125049), (63.845838881, -18.660355239))
            Line((63.845838881, -18.660355239), (64.622296016, -15.76257776))
        make_face()
        with BuildLine():
            ThreePointArc((66.5, 1.5), (63.315018359, 3.099609074), (59.866518188, 4))
            ThreePointArc((59.866518188, 4), (60, 0), (59.866518188, -4))
            ThreePointArc((59.866518188, -4), (63.315018359, -3.099609074), (66.5, -1.5))
            Line((66.5, -1.5), (66.5, 1.5))
        make_face()
        with BuildLine():
            ThreePointArc((63.845838881, 18.660355239), (60.355373564, 19.381125049), (56.791339868, 19.358298376))
            ThreePointArc((56.791339868, 19.358298376), (57.955549577, 15.529142706), (58.861892228, 11.630891766))
            ThreePointArc((58.861892228, 11.630891766), (61.959849286, 13.393140136), (64.622296016, 15.76257776))
            Line((64.622296016, 15.76257776), (63.845838881, 18.660355239))
        make_face()
        with BuildLine():
            ThreePointArc((56.840689352, 34.549038106), (53.282609803, 34.34184938), (49.845925587, 33.397360709))
            ThreePointArc((49.845925587, 33.397360709), (51.961524227, 30), (53.845925587, 26.469157479))
            ThreePointArc((53.845925587, 26.469157479), (56.382218877, 28.973168979), (58.340689352, 31.950961894))
            Line((58.340689352, 31.950961894), (56.840689352, 34.549038106))
        make_face()
        with BuildLine():
            ThreePointArc((45.961940777, 48.083261121), (42.578724237, 46.962233428), (39.503593852, 45.160448102))
            ThreePointArc((39.503593852, 45.160448102), (42.426406871, 42.426406871), (45.160448102, 39.503593852))
            ThreePointArc((45.160448102, 39.503593852), (46.962233428, 42.578724237), (48.083261121, 45.961940777))
            Line((48.083261121, 45.961940777), (45.961940777, 48.083261121))
        make_face()
        with BuildLine():
            ThreePointArc((31.950961894, 58.340689352), (28.973168979, 56.382218877), (26.469157479, 53.845925587))
            ThreePointArc((26.469157479, 53.845925587), (30, 51.961524227), (33.397360709, 49.845925587))
            ThreePointArc((33.397360709, 49.845925587), (34.34184938, 53.282609803), (34.549038106, 56.840689352))
            Line((34.549038106, 56.840689352), (31.950961894, 58.340689352))
        make_face()
        with BuildLine():
            Line((18.660355239, 63.845838881), (15.76257776, 64.622296016))
            ThreePointArc((15.76257776, 64.622296016), (13.393140136, 61.959849286), (11.630891766, 58.861892229))
            ThreePointArc((11.630891766, 58.861892229), (15.529142706, 57.955549577), (19.358298376, 56.791339868))
            ThreePointArc((19.358298376, 56.791339868), (19.381125049, 60.355373564), (18.660355239, 63.845838881))
        make_face()
    extrude(amount=CIRPATTERN1_DEPTH)

    # Sketch3 → Boss-Extrude3 (add, symmetric)
    with BuildSketch(Plane.XY):
        Circle(SKETCH3_R)
    extrude(amount=BOSS_EXTRUDE3_DEPTH, both=True)

    # Sketch4 → Cut-Extrude1 (cut, through all)
    with BuildSketch(Plane(origin=(0, 0, -20), x_dir=(-1, 0, 0), z_dir=(0, 0, -1))):
        with BuildLine():
            Line((-2.5, 9.682458366), (-2.5, 12))
            Line((-2.5, 12), (2.5, 12))
            Line((2.5, 12), (2.5, 9.682458366))
            ThreePointArc((2.5, 9.682458366), (0, -10), (-2.5, 9.682458366))
        make_face()
    extrude(amount=-CUT_EXTRUDE1_DEPTH, mode=Mode.SUBTRACT)

    # Sketch5 → Cut-Extrude4 (cut)
    with BuildSketch(Plane.XY.offset(CUT_EXTRUDE4_START)):
        Circle(SKETCH5_R)
        Circle(SKETCH5_R_2, mode=Mode.SUBTRACT)
    cut_extrude4 = extrude(amount=CUT_EXTRUDE4_DEPTH, mode=Mode.SUBTRACT)

    # Mirror3: Cut-Extrude4 across plane
    add(cut_extrude4.mirror(Plane.XY), mode=Mode.SUBTRACT)


solid = part.part
